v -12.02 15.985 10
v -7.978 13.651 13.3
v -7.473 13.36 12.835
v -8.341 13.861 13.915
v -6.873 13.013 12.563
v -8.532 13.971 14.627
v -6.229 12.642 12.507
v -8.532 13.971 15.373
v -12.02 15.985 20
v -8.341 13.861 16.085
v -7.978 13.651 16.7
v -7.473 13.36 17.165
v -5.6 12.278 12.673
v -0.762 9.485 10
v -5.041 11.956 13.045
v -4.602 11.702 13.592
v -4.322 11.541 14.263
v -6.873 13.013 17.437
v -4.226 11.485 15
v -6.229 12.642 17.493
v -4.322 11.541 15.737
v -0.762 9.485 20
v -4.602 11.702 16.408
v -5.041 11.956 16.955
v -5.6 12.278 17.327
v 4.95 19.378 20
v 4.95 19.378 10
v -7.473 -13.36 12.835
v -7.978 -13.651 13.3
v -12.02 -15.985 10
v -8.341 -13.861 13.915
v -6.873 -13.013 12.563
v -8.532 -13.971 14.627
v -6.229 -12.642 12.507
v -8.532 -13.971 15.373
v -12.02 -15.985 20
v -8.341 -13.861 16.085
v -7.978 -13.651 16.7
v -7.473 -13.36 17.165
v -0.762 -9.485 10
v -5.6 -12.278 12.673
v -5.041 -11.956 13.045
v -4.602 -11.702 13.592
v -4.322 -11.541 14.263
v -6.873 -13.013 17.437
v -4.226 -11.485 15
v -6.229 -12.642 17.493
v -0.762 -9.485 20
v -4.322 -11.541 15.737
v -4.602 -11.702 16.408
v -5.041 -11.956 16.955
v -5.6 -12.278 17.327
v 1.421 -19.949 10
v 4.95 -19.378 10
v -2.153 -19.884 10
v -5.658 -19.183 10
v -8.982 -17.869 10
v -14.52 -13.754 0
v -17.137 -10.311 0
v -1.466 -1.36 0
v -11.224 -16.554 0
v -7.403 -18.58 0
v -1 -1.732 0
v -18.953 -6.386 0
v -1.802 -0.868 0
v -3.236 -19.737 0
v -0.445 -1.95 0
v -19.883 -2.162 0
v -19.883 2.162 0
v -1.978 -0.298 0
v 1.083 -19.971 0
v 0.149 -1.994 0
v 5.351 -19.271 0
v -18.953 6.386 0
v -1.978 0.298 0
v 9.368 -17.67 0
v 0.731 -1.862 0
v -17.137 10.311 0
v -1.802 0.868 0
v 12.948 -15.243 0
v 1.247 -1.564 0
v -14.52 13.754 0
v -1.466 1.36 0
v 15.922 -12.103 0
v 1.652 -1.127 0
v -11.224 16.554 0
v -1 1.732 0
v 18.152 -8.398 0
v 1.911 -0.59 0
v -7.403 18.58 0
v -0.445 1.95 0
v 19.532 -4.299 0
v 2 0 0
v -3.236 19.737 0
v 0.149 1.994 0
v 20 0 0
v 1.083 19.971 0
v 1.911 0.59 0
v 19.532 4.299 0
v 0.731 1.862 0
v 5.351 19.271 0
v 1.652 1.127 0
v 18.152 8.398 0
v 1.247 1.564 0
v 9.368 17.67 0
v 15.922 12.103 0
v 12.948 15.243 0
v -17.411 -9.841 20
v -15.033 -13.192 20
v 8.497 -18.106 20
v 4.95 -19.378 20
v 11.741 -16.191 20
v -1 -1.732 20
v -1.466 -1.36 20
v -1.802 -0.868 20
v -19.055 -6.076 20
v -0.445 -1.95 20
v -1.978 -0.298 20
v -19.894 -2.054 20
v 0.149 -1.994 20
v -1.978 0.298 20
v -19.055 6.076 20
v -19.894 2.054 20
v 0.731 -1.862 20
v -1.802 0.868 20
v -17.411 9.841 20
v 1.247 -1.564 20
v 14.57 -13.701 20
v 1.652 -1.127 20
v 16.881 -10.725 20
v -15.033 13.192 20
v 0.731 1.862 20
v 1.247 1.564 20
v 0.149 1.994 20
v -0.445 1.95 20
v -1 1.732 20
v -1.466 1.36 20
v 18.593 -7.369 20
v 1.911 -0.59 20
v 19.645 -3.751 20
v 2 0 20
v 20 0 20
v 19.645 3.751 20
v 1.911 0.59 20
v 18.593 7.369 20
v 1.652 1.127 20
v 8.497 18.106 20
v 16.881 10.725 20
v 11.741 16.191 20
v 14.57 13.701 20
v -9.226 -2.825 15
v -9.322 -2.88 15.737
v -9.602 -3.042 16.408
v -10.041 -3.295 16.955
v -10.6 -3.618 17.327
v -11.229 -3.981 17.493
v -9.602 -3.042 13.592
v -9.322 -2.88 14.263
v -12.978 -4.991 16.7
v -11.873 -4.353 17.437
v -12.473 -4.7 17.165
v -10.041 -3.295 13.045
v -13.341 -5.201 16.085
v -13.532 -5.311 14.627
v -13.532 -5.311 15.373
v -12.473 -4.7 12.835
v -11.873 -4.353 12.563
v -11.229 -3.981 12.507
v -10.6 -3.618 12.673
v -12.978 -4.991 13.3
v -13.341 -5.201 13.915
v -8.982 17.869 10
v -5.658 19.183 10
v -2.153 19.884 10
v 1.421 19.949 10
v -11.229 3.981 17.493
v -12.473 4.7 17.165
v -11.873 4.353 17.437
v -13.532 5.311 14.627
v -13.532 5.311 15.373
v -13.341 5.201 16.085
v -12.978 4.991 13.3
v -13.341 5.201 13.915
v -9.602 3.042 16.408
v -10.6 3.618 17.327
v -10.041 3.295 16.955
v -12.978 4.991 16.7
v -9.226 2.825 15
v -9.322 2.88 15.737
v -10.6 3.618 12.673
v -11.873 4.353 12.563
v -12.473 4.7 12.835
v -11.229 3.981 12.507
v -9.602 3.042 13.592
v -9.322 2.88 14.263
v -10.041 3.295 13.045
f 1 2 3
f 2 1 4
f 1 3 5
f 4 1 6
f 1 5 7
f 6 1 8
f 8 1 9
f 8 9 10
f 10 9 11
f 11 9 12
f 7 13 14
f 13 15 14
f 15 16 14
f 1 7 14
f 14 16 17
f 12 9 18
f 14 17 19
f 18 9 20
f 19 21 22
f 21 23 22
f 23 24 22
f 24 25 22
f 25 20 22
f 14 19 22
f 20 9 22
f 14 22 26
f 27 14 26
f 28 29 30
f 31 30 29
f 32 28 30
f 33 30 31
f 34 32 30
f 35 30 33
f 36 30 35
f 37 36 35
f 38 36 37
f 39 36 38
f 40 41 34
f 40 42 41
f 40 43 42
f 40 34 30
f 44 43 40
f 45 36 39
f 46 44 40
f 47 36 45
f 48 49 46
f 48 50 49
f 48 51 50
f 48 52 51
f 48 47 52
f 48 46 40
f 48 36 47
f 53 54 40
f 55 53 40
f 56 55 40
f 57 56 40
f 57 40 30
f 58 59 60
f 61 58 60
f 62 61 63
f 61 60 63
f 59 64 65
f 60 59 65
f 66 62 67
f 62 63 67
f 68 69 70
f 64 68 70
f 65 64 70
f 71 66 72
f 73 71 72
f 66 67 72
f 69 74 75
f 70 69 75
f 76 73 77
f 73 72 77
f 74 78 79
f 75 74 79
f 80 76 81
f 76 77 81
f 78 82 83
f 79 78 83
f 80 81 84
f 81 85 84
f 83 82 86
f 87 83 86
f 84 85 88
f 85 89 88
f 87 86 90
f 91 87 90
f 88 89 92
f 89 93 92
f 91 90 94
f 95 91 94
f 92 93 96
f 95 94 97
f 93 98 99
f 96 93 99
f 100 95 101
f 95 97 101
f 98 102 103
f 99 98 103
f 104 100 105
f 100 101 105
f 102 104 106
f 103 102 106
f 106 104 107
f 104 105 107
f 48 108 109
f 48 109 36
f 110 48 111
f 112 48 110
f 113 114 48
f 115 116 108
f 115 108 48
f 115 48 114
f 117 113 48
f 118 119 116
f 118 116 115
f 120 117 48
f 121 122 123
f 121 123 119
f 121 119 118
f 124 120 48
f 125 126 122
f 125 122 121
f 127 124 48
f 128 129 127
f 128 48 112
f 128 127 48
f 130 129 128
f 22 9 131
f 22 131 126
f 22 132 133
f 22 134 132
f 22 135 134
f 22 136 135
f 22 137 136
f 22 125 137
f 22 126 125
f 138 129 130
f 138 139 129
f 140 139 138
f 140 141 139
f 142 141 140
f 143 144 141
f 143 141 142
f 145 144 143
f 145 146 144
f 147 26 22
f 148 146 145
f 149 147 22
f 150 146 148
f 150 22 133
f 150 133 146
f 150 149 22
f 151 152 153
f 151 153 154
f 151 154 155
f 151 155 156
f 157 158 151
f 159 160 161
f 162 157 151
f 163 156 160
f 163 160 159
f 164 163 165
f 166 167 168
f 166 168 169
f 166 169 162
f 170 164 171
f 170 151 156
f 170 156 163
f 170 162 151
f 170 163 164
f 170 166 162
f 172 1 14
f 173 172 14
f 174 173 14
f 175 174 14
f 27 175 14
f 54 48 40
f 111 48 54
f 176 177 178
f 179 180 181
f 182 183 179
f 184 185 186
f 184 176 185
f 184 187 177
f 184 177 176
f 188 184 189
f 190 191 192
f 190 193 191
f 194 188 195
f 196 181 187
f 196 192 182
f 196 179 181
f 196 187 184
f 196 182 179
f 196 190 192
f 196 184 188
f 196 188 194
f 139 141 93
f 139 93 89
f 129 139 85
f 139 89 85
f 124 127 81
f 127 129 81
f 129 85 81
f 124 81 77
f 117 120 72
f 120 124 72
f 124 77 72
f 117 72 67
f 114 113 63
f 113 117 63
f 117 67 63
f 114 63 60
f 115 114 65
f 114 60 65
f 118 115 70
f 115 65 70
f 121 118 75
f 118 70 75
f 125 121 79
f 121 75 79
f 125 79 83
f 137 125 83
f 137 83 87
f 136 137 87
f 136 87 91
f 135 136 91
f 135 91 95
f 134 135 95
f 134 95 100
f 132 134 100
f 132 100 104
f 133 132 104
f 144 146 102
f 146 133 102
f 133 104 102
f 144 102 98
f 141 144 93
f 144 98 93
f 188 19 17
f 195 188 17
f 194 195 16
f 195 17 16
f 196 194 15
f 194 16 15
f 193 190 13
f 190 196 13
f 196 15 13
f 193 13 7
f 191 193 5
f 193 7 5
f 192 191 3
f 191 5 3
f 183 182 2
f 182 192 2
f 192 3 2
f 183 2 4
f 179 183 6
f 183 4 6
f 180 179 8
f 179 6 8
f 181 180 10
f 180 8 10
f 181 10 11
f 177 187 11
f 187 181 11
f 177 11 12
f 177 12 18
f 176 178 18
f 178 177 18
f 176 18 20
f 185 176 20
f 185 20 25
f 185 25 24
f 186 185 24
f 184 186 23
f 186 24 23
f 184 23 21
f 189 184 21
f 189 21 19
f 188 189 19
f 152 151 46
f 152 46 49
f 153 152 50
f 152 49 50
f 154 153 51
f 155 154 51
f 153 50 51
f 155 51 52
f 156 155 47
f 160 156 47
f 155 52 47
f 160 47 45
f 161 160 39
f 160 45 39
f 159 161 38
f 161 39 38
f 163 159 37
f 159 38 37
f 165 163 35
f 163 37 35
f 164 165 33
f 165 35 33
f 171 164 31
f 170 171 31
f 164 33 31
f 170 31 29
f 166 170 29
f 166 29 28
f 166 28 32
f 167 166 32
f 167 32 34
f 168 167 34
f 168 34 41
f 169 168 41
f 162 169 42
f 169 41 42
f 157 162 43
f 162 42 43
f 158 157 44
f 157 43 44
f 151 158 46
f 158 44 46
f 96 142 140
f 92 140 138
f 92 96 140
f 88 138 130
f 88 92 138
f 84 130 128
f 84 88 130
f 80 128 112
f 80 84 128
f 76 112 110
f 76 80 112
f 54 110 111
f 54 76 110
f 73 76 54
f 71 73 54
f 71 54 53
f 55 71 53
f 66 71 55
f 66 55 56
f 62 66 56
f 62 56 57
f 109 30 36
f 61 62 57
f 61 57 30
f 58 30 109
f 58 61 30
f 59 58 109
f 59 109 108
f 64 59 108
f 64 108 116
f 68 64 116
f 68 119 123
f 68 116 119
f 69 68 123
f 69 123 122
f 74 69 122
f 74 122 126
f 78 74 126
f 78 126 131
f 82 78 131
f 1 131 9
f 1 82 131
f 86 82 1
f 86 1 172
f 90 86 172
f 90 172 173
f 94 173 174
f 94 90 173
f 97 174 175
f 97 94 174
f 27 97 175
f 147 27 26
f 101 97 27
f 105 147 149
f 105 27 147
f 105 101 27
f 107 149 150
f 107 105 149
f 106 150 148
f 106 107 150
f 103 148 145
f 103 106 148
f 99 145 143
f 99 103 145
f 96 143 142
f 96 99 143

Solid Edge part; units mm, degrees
sketch "Sketch1" plane through (0, 0, 0) normal (0, 0, 1) x (1, 0, 0)
  circle A0 centre (0, 0) radius 20
  circle A1 centre (0, 0) radius 2
  dimension "D1" = 40
  dimension "D2" = 4
extrude "ExtrudedProtrusion_1" add sketch "Sketch1" along normal blind 20
sketch "Sketch2" plane through (0, 0, 20) normal (0, 0, 1) x (1, 0, 0)
  line L0 (-0.7616, -9.485) -> (4.95, -19.3778)
  line L1 (-12.02, -15.985) -> (-0.7616, -9.485)
  arc A0 (4.95, -19.3778) -> (-12.02, -15.985) centre (0, 0) cw
  line L2 (-0.7616, 9.485) -> (4.95, 19.3778)
  line L3 (-12.02, 15.985) -> (-0.7616, 9.485)
  arc A1 (4.95, 19.3778) -> (-12.02, 15.985) centre (0, 0) ccw
extrude "ExtrudedCutout_1" cut sketch "Sketch2" against normal blind 10
sketch "Sketch3" plane through (-6.3908, -12.735, 15) normal (0.5, -0.8660254, 0) x (0.8660254, 0.5, 0)
  circle A0 centre (0, 0) radius 2.5
extrude "ExtrudedCutout_2" cut sketch "Sketch3" against normal blind 10
mirror "Mirror1" about plane through (0, 0, 0) normal (0, -1, 0) of "ExtrudedCutout_2"
properties material "Aluminio"
